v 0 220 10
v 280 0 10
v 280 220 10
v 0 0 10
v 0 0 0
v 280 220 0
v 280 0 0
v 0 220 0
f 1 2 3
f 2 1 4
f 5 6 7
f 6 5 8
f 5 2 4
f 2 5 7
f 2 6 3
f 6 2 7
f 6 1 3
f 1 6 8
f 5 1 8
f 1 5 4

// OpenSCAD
module LcdPanel(lcd_size = 14) {
  lcd_thickness = 10;
  // src https://en.wikipedia.org/wiki/Display_size
  lcd_width = 280;
  lcd_height = 220;
  cube([lcd_width, lcd_height, lcd_thickness]);
}

LcdPanel();
